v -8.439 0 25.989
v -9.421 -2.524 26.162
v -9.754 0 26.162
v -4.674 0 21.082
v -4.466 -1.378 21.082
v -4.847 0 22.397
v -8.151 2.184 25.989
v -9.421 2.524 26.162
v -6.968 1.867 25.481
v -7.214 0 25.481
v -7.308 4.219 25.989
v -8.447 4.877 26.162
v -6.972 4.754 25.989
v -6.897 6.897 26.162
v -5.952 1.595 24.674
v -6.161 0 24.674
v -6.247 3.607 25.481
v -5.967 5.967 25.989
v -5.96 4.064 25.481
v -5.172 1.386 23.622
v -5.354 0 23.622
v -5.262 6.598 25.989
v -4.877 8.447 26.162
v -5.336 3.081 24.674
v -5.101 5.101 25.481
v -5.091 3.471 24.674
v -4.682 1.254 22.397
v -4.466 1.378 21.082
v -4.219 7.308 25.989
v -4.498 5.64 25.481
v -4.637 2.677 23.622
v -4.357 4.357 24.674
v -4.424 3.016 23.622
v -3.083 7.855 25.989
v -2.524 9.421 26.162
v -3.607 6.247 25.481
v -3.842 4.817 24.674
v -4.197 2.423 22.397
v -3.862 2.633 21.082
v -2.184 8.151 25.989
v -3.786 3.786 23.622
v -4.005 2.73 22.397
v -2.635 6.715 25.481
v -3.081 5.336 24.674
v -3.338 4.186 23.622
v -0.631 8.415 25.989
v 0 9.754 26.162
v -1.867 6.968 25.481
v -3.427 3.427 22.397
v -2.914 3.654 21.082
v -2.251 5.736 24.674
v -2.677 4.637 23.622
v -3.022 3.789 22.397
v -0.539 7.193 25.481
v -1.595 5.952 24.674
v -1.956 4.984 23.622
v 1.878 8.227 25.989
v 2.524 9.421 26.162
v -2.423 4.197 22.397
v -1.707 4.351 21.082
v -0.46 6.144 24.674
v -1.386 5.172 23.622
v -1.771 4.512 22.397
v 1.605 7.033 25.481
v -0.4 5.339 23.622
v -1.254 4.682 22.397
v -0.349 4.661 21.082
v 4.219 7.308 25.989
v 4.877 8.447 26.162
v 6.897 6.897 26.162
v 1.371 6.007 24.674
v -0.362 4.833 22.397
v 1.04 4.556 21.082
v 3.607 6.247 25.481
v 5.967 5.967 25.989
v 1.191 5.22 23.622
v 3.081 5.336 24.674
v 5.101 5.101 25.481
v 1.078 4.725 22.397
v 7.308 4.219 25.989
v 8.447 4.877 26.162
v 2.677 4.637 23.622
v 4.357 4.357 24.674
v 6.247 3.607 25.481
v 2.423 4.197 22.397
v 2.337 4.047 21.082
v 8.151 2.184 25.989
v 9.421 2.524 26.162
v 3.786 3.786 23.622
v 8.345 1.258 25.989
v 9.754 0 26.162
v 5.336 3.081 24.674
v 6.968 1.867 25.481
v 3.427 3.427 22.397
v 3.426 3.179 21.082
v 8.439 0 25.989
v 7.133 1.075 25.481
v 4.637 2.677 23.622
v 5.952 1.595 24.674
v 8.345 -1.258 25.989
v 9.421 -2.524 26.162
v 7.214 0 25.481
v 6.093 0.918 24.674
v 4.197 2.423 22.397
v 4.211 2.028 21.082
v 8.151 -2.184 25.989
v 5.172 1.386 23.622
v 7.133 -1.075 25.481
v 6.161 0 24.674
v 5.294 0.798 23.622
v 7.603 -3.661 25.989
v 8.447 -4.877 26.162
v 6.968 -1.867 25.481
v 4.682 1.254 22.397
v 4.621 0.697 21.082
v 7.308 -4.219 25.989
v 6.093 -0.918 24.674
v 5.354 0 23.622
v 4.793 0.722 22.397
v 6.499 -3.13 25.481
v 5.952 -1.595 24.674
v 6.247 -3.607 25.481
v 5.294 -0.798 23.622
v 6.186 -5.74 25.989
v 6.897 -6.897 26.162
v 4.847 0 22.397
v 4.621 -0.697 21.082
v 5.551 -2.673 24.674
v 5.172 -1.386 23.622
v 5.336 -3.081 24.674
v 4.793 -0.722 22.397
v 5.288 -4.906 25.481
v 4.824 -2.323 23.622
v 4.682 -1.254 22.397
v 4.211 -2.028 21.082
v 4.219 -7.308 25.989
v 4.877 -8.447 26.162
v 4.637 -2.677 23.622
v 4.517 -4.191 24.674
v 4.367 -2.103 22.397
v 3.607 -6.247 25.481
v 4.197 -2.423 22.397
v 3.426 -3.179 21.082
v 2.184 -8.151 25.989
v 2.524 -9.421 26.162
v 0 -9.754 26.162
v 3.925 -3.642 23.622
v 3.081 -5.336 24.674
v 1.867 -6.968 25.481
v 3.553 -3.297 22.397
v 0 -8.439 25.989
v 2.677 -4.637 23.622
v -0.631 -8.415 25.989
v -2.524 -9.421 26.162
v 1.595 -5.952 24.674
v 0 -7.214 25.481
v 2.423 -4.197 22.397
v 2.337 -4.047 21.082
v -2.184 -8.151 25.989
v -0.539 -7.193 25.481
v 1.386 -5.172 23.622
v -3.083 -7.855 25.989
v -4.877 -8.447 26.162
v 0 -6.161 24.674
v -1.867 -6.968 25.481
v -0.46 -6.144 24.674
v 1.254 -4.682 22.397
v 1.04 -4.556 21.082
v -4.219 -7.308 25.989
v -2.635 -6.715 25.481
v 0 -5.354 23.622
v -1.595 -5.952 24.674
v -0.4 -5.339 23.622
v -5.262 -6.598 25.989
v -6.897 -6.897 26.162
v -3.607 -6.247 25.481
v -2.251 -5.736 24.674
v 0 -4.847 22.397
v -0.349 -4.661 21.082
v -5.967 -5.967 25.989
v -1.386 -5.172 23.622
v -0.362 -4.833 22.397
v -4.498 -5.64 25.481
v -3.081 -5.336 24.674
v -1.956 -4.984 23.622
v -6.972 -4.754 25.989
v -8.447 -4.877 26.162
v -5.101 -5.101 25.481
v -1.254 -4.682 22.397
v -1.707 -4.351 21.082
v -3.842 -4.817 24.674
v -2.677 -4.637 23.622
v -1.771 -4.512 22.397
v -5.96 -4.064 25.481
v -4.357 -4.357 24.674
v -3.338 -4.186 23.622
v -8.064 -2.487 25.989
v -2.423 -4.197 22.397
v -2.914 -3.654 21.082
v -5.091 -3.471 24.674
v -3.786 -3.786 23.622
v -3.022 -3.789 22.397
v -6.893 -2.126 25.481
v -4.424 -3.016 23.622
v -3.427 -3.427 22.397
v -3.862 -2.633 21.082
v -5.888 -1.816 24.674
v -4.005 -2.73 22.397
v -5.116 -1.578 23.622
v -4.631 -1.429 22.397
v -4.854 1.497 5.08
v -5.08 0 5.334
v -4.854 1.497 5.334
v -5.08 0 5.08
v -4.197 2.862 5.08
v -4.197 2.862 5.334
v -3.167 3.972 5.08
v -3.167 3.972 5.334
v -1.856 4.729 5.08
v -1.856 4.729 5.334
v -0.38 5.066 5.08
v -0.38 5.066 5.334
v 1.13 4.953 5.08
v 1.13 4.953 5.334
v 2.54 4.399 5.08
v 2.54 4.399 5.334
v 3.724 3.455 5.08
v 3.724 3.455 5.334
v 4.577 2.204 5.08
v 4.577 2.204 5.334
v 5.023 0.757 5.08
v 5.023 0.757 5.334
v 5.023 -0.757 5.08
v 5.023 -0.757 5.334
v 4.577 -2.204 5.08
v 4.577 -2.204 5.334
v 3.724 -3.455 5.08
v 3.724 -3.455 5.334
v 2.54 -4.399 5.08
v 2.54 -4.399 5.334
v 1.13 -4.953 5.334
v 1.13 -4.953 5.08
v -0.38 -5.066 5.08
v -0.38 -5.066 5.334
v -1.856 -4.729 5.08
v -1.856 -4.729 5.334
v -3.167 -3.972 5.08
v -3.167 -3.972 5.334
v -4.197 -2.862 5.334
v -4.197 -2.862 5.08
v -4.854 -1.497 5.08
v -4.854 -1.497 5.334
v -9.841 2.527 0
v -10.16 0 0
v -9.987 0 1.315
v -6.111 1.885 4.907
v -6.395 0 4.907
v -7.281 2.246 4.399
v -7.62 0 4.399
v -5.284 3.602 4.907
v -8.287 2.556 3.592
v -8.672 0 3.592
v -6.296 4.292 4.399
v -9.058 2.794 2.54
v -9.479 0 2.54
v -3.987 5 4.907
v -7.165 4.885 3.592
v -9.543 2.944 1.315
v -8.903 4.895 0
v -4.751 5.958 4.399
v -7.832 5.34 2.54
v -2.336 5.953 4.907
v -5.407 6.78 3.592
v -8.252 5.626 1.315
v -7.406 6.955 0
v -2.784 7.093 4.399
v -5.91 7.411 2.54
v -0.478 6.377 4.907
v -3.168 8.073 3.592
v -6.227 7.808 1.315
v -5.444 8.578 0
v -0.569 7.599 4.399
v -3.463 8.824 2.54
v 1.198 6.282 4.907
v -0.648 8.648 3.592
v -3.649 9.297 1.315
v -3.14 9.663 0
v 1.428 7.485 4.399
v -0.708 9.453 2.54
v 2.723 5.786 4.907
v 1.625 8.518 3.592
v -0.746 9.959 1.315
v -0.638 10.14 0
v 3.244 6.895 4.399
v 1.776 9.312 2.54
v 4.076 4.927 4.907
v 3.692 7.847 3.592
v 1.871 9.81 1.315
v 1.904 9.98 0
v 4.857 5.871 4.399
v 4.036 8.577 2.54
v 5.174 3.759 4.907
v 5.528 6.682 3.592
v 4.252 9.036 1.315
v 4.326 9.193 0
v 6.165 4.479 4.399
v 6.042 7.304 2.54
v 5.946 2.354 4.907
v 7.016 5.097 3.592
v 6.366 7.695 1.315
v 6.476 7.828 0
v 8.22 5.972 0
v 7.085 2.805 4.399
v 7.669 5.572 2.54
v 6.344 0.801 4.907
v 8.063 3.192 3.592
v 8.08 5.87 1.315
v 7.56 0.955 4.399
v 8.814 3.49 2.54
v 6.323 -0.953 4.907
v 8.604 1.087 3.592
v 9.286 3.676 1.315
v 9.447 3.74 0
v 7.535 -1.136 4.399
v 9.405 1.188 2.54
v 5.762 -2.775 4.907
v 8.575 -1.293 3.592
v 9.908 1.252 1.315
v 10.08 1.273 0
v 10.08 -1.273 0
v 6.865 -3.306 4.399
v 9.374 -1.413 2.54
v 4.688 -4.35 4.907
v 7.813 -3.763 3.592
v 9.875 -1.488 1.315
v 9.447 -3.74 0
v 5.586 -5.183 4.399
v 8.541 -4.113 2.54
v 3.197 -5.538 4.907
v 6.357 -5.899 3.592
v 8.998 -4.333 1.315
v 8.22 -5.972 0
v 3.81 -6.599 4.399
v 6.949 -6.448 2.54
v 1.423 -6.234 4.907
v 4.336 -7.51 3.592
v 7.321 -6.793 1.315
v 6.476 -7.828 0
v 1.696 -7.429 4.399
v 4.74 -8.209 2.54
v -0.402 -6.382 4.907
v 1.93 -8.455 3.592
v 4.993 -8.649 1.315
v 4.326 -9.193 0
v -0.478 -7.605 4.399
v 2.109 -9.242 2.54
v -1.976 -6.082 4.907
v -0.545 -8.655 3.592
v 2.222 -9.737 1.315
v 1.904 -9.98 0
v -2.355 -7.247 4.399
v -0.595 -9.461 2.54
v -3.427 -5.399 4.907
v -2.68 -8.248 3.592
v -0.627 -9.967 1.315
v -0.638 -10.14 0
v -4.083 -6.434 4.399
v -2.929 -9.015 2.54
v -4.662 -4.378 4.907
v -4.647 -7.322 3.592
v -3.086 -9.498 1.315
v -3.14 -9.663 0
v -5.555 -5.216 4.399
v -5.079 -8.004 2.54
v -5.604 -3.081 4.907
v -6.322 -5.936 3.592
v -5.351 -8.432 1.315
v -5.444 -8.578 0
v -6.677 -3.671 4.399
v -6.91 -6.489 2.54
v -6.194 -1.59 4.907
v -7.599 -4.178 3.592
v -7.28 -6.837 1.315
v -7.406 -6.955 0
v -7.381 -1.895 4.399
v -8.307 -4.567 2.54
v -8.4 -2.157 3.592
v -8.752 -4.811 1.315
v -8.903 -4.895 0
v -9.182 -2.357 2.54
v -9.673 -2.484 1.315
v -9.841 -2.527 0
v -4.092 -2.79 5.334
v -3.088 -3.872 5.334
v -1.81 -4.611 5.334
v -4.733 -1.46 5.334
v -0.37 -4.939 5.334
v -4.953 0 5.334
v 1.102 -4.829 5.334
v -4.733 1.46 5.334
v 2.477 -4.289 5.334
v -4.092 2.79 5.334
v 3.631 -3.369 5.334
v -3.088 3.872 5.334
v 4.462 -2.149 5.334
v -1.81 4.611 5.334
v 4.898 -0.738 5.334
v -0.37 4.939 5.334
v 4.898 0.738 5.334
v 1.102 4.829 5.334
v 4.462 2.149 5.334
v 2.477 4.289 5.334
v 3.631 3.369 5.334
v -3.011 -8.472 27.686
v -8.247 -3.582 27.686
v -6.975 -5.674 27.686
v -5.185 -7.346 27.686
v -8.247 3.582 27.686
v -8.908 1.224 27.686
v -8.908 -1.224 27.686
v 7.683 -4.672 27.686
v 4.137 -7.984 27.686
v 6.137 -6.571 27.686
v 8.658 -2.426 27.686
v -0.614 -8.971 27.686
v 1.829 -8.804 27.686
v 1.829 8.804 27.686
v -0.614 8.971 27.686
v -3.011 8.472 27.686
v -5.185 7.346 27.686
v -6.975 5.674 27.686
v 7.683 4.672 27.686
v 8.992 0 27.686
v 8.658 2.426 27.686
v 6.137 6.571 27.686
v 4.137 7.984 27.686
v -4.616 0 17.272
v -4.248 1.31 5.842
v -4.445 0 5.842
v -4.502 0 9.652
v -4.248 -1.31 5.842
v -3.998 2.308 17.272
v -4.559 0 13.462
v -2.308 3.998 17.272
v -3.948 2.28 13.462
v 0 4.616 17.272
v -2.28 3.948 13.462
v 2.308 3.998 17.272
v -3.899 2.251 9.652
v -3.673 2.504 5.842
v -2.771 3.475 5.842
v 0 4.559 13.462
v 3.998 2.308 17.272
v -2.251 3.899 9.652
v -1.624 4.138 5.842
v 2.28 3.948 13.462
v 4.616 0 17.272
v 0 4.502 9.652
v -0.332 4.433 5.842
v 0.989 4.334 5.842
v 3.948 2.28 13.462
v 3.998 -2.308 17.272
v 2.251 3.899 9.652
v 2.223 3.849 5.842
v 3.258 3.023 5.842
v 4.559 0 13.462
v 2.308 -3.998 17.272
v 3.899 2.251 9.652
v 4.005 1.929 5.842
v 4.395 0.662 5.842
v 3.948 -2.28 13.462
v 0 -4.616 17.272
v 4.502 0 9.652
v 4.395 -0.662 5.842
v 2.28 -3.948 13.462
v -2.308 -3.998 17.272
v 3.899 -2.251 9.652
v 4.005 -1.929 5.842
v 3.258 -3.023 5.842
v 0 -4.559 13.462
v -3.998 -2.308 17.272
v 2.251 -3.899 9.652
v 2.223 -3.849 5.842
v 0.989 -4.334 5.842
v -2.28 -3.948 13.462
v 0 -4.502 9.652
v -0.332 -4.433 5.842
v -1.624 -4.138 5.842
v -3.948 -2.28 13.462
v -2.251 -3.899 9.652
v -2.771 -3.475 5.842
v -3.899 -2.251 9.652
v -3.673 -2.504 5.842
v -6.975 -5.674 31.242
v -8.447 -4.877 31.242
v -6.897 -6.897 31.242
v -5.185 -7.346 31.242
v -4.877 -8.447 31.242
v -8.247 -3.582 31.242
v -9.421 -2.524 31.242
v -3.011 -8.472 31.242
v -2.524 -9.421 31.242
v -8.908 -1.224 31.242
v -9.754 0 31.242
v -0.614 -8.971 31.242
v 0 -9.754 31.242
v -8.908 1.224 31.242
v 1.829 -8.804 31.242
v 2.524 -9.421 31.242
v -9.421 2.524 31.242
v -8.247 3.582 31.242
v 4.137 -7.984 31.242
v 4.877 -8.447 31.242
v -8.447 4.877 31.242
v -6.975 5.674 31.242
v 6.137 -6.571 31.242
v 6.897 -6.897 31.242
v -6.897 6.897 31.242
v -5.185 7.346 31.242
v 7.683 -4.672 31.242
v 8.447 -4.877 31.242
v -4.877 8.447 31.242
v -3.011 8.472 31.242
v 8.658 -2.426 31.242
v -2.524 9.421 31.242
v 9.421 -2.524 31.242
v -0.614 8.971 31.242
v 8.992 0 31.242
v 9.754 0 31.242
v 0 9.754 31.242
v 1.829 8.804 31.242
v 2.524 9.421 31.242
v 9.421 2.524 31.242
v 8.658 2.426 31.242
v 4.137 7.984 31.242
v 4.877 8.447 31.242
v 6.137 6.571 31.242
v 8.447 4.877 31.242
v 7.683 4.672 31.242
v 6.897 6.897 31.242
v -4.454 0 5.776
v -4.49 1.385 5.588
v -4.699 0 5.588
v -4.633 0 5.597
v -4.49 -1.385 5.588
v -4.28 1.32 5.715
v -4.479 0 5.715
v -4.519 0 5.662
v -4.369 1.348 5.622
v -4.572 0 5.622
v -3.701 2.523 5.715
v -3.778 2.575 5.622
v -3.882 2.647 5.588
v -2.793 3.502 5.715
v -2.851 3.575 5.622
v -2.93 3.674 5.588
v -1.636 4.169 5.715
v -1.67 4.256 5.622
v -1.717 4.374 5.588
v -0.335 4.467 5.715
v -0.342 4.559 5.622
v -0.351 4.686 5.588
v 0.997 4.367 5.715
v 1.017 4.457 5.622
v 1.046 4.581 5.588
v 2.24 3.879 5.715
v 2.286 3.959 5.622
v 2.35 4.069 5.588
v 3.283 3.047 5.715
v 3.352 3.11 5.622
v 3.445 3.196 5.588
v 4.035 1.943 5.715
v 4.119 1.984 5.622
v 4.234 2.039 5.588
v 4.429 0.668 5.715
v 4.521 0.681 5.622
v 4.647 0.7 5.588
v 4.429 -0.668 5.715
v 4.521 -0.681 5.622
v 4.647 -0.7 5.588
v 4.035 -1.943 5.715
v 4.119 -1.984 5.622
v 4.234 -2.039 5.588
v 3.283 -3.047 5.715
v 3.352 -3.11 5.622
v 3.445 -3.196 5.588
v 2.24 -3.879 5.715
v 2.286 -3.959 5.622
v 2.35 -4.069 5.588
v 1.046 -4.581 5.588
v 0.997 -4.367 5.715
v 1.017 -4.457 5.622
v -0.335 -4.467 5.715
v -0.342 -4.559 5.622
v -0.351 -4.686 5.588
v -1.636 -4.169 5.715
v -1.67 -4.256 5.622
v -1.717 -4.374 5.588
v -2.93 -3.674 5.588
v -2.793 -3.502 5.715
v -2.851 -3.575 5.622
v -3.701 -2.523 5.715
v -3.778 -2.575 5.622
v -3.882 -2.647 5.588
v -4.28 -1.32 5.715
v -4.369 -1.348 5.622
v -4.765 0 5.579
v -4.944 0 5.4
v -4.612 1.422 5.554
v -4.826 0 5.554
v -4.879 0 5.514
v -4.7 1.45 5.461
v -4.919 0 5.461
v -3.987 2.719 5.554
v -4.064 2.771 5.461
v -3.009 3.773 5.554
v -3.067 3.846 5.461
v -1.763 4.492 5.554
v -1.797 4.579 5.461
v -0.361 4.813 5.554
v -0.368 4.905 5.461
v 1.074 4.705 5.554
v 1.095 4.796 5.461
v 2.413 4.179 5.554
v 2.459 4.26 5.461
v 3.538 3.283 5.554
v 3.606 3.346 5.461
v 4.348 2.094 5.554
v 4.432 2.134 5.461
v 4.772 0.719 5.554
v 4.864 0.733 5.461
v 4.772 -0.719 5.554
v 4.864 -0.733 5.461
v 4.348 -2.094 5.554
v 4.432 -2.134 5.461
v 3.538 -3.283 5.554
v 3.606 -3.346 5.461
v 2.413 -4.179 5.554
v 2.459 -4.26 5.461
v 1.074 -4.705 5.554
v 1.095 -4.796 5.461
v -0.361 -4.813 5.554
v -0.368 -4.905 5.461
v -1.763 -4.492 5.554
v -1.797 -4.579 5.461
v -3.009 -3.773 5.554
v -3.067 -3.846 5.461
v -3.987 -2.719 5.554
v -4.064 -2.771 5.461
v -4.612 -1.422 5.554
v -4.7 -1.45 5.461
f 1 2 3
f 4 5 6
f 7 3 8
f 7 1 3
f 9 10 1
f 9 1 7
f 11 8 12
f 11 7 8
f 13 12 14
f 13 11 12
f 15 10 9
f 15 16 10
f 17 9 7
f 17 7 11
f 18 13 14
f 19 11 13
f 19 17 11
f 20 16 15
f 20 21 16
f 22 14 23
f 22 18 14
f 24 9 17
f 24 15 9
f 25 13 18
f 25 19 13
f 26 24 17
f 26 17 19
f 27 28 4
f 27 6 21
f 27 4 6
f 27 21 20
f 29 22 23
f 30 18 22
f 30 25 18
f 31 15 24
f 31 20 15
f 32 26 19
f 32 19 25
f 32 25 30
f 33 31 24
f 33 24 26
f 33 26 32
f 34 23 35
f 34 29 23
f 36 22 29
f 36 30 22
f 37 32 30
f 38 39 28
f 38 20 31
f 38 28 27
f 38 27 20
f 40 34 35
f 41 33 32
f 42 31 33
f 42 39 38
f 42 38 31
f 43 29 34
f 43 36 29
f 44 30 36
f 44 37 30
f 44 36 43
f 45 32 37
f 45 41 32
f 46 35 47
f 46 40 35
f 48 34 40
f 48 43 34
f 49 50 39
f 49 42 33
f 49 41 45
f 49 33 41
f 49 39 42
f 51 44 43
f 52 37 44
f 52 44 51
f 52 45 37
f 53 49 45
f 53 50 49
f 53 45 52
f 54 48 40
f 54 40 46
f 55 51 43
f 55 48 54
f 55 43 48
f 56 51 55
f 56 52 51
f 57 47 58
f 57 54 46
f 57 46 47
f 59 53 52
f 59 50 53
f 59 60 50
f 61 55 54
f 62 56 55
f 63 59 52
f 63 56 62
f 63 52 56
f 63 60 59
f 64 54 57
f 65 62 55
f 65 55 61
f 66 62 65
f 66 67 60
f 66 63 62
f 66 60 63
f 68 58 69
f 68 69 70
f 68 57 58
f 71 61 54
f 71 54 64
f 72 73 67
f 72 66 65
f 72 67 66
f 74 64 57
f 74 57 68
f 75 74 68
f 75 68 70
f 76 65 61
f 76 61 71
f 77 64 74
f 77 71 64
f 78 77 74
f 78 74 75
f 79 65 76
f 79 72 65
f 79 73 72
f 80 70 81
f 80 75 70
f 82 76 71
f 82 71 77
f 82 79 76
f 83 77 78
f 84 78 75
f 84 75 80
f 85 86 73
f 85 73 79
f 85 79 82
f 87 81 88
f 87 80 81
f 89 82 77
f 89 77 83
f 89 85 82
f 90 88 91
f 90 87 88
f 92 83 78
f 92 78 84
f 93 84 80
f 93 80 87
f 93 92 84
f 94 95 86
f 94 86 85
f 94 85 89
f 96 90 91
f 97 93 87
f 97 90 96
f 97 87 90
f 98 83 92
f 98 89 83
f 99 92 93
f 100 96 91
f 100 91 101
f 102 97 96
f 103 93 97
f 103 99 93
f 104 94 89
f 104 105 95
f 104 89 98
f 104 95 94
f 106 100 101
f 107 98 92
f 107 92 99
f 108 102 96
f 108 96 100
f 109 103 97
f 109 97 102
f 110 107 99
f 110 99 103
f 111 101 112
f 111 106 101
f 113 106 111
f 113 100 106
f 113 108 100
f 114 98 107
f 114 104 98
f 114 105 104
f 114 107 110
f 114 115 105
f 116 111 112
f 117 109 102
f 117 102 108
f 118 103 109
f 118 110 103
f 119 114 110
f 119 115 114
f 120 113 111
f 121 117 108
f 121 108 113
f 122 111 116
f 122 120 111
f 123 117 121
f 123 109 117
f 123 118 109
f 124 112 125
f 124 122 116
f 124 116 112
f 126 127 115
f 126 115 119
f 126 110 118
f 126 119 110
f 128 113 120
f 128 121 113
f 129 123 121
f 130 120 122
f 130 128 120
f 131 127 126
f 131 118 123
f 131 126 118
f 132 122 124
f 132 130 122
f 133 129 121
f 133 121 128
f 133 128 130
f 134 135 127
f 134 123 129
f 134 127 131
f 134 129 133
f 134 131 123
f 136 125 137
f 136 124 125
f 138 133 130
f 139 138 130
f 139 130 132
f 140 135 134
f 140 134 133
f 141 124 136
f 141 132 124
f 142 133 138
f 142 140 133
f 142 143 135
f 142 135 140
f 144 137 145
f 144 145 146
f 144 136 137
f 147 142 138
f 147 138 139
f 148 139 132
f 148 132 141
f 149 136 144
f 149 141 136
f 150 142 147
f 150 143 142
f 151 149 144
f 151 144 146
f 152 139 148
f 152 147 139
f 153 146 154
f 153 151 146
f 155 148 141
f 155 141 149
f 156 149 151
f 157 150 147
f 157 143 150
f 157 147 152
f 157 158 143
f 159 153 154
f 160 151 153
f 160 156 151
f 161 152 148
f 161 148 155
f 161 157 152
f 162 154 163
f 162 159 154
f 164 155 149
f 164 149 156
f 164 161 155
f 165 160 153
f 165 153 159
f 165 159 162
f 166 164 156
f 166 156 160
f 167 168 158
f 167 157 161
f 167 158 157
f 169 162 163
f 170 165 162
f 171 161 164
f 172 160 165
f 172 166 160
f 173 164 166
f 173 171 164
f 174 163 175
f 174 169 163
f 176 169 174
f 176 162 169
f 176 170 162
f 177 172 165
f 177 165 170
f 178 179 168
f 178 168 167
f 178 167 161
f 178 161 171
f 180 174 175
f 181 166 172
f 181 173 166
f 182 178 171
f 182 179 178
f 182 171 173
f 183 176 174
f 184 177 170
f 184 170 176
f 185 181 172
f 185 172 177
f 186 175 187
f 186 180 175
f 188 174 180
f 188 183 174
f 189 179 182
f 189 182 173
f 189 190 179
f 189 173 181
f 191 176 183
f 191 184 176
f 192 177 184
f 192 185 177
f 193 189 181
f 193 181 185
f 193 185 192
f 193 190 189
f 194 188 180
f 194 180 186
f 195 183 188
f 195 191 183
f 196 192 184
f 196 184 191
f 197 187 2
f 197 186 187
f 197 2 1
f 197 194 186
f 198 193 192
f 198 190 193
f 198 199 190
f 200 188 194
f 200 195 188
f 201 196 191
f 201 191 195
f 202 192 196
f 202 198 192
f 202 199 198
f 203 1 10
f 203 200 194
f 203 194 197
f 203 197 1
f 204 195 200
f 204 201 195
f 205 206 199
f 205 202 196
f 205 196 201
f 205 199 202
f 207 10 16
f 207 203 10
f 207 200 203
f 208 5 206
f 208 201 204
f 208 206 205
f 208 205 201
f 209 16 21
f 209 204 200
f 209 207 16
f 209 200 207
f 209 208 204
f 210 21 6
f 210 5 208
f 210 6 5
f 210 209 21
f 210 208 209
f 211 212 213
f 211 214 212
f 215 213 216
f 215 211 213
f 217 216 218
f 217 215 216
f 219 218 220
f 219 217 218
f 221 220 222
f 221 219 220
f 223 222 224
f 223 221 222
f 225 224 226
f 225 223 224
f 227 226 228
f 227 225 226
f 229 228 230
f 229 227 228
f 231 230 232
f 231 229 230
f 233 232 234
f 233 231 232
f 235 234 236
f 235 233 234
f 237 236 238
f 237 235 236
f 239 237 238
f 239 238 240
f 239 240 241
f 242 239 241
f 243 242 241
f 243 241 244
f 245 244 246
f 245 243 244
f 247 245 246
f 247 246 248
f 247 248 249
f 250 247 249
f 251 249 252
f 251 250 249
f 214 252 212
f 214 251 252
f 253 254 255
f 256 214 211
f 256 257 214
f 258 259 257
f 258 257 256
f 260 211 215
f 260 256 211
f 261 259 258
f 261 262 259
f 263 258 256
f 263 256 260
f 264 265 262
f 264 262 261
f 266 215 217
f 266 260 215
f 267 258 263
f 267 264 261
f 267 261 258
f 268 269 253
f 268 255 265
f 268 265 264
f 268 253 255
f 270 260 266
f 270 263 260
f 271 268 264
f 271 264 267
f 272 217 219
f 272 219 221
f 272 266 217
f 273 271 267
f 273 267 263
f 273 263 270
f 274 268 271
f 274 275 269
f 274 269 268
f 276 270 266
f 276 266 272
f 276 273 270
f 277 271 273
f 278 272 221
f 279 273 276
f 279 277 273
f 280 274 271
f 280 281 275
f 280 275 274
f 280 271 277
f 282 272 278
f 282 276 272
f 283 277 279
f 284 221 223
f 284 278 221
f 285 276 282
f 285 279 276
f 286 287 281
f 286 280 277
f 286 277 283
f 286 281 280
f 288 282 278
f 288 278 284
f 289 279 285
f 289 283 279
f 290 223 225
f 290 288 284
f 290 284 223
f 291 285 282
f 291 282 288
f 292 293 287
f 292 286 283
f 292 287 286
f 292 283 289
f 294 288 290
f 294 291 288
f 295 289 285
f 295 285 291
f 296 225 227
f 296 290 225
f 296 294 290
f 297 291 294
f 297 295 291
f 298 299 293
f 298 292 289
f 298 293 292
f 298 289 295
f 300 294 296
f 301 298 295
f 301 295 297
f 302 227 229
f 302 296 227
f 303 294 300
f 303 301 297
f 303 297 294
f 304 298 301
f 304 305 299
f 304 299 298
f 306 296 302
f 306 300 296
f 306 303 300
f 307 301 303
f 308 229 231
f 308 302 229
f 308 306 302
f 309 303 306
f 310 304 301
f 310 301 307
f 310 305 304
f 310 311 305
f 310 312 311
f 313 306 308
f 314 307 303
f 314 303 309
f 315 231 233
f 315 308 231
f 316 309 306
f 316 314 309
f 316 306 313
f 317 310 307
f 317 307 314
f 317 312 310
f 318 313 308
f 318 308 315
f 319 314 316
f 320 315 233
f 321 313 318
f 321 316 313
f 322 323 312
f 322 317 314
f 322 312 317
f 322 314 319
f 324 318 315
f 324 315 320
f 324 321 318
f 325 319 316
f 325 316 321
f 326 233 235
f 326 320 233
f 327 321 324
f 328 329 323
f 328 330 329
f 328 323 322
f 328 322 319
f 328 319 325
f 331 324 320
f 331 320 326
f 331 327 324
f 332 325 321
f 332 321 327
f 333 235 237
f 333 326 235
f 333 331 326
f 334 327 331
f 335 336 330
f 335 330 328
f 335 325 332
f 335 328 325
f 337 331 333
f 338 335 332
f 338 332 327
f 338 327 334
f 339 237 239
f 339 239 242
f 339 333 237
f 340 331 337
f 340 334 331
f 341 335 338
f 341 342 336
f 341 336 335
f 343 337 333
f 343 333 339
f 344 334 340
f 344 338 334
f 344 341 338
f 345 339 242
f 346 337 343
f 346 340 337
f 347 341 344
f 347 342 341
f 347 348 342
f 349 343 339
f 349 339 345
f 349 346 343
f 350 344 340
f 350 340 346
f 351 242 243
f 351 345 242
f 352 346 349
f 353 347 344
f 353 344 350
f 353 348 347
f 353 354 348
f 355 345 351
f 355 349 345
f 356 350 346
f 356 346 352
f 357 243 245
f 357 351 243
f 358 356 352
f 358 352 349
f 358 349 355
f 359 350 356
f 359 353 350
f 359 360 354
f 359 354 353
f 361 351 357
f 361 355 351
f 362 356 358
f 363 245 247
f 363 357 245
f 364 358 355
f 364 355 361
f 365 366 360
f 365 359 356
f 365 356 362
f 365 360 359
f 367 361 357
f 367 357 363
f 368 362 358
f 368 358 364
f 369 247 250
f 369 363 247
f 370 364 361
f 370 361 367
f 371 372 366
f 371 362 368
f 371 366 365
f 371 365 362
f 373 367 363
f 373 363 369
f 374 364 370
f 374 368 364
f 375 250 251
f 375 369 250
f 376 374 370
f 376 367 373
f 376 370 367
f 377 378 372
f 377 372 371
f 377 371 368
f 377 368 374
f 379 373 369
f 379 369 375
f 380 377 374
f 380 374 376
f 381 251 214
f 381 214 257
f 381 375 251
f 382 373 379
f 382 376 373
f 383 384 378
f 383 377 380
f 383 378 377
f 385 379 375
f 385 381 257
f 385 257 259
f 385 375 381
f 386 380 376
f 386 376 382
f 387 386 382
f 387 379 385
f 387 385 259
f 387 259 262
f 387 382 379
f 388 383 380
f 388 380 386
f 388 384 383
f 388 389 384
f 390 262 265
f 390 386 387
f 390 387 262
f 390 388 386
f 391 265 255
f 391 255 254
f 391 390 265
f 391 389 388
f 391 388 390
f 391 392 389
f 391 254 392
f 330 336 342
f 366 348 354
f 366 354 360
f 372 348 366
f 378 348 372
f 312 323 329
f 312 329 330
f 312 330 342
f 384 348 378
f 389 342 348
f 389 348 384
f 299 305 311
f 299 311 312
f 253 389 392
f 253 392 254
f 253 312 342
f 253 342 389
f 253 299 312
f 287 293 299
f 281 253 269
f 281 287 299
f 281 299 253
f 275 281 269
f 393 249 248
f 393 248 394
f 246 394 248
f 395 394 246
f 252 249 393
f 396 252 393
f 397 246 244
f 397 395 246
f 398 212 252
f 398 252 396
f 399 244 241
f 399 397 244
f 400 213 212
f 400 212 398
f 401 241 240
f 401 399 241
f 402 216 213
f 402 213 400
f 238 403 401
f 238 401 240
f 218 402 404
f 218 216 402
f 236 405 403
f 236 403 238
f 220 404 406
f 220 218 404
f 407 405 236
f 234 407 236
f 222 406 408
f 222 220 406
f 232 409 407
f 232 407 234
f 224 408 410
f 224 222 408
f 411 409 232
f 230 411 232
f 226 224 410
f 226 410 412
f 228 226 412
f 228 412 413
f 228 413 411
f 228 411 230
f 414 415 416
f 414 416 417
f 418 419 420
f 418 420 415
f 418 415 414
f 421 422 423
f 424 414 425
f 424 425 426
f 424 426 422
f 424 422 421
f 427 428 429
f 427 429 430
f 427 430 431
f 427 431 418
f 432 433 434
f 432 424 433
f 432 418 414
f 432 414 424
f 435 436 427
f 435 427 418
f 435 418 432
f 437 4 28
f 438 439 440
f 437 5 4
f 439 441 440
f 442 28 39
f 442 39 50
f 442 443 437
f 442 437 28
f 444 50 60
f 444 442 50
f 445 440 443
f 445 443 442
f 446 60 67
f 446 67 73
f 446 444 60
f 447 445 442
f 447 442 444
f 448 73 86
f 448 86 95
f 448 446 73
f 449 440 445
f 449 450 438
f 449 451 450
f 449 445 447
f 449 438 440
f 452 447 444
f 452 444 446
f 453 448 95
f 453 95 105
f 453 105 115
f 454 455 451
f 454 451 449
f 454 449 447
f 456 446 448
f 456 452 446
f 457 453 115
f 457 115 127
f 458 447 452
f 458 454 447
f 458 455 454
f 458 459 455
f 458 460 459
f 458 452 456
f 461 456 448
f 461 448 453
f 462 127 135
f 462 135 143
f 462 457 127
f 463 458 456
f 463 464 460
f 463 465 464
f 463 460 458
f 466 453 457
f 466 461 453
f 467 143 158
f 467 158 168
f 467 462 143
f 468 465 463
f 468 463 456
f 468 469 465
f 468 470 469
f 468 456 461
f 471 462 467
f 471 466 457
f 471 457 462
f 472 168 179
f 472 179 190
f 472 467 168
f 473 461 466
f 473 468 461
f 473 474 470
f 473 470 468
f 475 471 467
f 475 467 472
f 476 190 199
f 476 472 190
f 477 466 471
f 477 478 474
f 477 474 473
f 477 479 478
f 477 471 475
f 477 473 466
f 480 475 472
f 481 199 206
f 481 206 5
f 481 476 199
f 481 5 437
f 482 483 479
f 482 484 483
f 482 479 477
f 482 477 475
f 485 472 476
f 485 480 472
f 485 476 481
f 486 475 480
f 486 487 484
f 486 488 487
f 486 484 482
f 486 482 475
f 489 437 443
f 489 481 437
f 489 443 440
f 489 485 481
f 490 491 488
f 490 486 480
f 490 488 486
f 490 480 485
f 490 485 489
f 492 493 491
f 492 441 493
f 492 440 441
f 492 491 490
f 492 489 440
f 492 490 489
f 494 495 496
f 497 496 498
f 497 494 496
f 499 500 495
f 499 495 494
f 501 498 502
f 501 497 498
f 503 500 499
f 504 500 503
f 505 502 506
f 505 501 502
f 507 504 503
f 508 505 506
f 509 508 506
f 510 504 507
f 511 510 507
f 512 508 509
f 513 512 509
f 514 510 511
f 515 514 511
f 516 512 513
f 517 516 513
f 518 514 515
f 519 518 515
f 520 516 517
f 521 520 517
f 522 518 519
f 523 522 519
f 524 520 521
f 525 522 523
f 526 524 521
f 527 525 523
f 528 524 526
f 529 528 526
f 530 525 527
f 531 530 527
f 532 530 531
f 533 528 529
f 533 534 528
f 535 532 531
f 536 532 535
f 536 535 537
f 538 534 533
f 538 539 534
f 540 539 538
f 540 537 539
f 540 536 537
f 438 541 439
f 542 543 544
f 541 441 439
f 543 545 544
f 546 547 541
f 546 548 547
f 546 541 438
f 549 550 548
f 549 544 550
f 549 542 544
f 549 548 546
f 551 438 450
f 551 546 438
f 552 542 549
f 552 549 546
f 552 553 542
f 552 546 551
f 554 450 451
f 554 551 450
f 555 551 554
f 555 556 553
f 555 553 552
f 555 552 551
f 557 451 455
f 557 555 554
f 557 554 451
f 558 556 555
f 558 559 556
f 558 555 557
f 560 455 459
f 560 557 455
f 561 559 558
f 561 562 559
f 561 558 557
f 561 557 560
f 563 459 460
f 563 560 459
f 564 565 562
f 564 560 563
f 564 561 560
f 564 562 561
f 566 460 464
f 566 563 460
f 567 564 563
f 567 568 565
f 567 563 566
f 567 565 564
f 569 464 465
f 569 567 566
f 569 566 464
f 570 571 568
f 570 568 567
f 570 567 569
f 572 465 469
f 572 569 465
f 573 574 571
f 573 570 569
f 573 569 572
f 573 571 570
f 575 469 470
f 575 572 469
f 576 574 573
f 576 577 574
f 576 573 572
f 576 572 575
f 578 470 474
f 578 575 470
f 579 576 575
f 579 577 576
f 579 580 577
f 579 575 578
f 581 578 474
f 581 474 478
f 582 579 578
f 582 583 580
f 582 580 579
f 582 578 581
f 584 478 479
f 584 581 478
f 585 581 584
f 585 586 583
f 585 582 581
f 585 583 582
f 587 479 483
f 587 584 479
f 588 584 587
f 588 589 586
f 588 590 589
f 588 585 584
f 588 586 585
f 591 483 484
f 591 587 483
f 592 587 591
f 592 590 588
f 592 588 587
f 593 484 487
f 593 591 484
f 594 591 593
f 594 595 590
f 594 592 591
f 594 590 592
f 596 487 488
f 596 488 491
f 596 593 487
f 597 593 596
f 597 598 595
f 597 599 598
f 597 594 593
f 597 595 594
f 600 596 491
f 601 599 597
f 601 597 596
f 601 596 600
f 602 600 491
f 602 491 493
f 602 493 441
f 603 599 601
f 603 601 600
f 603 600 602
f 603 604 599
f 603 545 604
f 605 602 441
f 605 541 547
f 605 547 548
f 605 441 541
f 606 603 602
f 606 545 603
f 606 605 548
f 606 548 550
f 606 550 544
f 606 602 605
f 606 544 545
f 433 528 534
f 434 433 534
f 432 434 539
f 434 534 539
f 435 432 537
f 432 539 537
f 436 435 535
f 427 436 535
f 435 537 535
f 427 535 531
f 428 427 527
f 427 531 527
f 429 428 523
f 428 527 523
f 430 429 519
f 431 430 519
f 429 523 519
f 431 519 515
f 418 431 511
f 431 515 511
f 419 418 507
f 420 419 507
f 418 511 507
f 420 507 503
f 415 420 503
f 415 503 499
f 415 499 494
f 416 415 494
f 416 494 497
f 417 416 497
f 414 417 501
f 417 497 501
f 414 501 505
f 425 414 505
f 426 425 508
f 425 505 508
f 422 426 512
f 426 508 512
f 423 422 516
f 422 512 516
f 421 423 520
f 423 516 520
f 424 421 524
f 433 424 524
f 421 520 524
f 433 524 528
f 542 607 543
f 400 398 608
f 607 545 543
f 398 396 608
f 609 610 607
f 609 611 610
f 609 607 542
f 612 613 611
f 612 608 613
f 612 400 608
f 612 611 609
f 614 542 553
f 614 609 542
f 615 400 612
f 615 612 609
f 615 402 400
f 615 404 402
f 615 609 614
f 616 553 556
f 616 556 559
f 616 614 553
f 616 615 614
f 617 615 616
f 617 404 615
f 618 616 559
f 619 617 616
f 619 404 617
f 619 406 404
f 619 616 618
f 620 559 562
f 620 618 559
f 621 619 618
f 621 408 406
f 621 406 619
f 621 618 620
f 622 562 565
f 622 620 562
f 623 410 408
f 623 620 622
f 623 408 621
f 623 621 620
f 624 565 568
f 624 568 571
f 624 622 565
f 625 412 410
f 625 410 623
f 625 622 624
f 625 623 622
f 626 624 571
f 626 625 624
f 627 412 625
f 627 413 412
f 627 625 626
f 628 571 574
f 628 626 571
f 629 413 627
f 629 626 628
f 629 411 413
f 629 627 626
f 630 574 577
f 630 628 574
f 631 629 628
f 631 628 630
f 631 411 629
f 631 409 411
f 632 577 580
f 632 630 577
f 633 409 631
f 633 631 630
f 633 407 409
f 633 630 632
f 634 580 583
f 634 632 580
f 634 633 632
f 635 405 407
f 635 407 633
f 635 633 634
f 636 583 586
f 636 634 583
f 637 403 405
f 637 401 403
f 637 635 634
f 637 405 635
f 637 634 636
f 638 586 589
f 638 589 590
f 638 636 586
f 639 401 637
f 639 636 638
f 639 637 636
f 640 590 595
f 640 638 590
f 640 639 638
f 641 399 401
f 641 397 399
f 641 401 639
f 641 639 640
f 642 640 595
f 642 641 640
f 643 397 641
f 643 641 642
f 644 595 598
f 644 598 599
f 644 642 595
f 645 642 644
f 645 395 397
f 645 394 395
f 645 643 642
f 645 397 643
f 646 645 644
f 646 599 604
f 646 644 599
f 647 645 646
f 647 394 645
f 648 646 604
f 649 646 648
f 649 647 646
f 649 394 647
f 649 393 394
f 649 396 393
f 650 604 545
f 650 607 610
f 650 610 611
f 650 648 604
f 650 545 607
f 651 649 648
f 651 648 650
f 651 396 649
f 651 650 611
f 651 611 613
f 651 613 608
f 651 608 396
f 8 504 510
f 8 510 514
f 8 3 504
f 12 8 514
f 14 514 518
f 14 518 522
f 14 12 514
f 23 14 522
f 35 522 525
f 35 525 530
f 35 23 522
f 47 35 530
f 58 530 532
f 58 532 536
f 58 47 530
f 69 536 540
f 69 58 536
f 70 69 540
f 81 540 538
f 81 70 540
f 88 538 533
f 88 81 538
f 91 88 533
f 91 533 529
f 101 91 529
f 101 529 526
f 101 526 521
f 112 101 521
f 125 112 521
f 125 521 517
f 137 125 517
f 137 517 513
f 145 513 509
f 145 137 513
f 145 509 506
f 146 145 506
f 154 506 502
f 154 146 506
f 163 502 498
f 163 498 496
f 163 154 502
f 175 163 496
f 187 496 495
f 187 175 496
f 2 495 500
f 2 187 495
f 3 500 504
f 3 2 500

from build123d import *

# Parameters (mm, degrees)
F2_R     = 8.9916
F3_DEPTH = 3.556
F5_DEPTH = 1.778


with BuildPart() as f1:
    # F0 (on Front) → F1 (revolve)
    with BuildSketch(Plane.XZ):
        with BuildLine():
            Line((-10.16, 0), (0, 0))
            Line((0, 0), (0, 31.242))
            Line((0, 31.242), (-9.7536, 31.242))
            Line((-9.7536, 31.242), (-9.7536, 26.162))
            ThreePointArc((-9.7536, 26.162), (-6.161498, 24.674102), (-4.6736, 21.082))
            Line((-4.6736, 21.082), (-4.445, 5.842))
            ThreePointArc((-4.445, 5.842), (-4.519395, 5.662395), (-4.699, 5.588))
            ThreePointArc((-4.699, 5.588), (-4.878605, 5.513605), (-4.953, 5.334))
            Line((-4.953, 5.334), (-5.08, 5.334))
            Line((-5.08, 5.334), (-5.08, 5.08))
            ThreePointArc((-5.08, 5.08), (-8.672102, 3.592102), (-10.16, 0))
        make_face()
    revolve(axis=Axis((0, 0, 15.621), (0, 0, -1)))

    # F2 (on face) → F3 (cut)
    with BuildSketch(Plane.XY.offset(31.242)):
        Circle(F2_R)
    extrude(amount=-F3_DEPTH, mode=Mode.SUBTRACT)

    # F4 (on face) → F5 (cut)
    with BuildSketch(Plane.XY.offset(31.242)):
        Polygon((-0.508, -0.508), (-0.508, 0), (-0.508, 0.508), (-8.064261, 0.508), (-8.064261, -0.508), align=None)
        Polygon((-0.508, 6.998243), (-0.508, 0.508), (0, 0.508), (0.508, 0.508), (0.508, 6.998243), align=None)
        Polygon((0, -0.508), (-0.508, -0.508), (-0.508, -7.178504), (0.508, -7.178504), (0.508, -0.508), align=None)
        Polygon((0.508, 0.508), (0.508, 0), (0.508, -0.508), (7.389117, -0.508), (7.389117, 0.508), align=None)
    extrude(amount=-F5_DEPTH, mode=Mode.SUBTRACT)


solid = f1.part
